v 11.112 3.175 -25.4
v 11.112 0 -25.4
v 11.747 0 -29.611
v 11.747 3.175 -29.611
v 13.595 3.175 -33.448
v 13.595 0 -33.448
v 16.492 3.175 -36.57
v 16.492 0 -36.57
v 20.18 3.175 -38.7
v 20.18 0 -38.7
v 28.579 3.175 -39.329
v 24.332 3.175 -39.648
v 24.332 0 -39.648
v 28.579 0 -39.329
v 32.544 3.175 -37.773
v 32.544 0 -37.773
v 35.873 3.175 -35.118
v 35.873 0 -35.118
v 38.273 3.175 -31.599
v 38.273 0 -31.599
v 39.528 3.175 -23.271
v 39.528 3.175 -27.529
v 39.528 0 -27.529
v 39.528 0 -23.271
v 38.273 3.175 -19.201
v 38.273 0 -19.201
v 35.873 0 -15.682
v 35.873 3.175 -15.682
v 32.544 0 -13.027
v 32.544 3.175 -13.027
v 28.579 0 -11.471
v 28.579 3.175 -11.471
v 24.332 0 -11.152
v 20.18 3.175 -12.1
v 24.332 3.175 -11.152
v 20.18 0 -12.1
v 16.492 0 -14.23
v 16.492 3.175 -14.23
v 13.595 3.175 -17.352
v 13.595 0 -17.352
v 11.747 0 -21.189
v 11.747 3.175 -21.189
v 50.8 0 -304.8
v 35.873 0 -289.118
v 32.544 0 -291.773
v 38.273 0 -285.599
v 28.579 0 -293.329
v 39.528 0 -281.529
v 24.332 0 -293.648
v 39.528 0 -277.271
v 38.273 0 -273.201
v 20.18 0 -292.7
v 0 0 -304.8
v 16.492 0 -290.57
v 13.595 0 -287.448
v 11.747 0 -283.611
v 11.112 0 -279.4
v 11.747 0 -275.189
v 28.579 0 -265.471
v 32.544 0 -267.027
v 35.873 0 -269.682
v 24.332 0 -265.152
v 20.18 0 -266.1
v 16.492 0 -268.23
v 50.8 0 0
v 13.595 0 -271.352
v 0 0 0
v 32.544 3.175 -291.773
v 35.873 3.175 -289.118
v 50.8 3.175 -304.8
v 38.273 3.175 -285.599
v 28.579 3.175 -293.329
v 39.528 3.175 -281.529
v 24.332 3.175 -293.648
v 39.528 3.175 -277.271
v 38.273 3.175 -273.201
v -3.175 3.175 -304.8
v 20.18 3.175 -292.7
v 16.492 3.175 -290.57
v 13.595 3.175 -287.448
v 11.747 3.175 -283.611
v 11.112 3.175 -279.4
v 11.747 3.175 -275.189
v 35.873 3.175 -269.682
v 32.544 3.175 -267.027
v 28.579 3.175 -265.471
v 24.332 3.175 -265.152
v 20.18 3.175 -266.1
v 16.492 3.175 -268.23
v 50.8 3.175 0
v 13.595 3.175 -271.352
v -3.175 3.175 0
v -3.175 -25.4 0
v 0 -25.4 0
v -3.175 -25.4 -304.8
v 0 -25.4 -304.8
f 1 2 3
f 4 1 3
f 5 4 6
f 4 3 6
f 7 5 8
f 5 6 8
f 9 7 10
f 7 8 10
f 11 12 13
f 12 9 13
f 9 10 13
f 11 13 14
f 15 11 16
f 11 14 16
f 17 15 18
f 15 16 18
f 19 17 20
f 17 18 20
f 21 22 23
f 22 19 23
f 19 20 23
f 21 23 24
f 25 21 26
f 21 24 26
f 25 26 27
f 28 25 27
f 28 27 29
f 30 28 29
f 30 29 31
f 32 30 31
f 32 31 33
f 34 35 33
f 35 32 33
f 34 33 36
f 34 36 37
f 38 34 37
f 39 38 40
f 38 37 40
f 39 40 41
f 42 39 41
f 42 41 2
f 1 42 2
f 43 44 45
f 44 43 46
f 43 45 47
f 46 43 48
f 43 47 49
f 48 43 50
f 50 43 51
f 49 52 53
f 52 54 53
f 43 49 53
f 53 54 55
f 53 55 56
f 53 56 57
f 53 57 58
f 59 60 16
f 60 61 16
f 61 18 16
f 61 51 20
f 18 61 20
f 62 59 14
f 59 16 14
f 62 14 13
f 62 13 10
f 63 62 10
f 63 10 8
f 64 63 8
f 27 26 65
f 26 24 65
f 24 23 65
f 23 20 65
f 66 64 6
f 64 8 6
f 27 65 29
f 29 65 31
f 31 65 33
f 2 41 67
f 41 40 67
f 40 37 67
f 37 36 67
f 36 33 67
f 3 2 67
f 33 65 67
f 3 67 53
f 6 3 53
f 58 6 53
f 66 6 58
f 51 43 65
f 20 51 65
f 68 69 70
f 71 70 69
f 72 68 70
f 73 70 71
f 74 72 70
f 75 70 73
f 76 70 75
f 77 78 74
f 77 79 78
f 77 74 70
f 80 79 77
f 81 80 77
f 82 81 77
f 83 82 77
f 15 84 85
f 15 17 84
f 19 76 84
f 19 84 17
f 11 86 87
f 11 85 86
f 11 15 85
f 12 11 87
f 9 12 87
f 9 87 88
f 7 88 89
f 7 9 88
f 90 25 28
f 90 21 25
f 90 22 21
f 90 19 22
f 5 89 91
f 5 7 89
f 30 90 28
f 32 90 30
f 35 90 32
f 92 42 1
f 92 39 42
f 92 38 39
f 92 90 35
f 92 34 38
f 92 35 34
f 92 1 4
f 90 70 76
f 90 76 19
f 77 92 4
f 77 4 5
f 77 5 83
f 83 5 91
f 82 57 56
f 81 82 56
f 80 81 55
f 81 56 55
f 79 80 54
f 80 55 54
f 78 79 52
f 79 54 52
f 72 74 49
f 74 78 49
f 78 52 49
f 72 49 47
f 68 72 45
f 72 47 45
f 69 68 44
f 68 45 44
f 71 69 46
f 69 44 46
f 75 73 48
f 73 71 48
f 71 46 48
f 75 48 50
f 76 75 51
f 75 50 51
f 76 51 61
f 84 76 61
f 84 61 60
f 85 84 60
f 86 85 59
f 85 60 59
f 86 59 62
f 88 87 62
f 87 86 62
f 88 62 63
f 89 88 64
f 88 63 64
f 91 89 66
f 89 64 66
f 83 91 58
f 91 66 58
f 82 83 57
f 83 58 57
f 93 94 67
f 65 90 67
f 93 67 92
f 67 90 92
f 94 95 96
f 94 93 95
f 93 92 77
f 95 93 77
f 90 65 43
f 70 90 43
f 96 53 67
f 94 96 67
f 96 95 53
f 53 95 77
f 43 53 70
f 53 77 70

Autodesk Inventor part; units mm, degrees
ref_plane "YZ Plane" through (0, 0, 0) normal (1, 0, 0) x (0, 1, 0)
ref_plane "XZ Plane" through (0, 0, 0) normal (0, 1, 0) x (-1, 0, 0)
ref_plane "XY Plane" through (0, 0, 0) normal (0, 0, 1) x (1, 0, 0)
sketch "Sketch1" plane through (0, 0, 0) normal (0, 1, 0) x (-1, 0, 0)
  line L0 (0, 0) -> (-50.8, 0)
  line L1 (-50.8, 0) -> (-50.8, -304.8)
  line L2 (-50.8, -304.8) -> (0, -304.8)
  line L3 (0, -304.8) -> (0, 0)
  circle A0 centre (-25.4, -25.4) radius 14.2875
  circle A1 centre (-25.4, -279.4) radius 14.2875
  dimension "d0" = 304.8
  dimension "d1" = 50.8
  dimension "d2" = 25.4
  dimension "d3" = 25.4
  dimension "d4" = 25.4
  dimension "d5" = 25.4
  dimension "d6" = 28.575
  dimension "d7" = 28.575
extrude "Extrusion1" add sketch "Sketch1" along normal blind 3.175
sketch "Sketch2" plane through (0, 0, -304.8) normal (-1, 0, 0) x (0, 0, 1)
  line L0 (304.8, 3.175) -> (0, 3.175)
  line L1 (0, 3.175) -> (0, 0)
  line L2 (0, 0) -> (304.8, 0)
  line L3 (304.8, 0) -> (304.8, 3.175)
extrude "Extrusion2" add sketch "Sketch2" along normal blind 3.175
sketch "Sketch3" plane through (0, 0, 0) normal (0, -1, 0) x (1, 0, 0)
  line L0 (0, 0) -> (-3.175, 0)
  line L1 (-3.175, 0) -> (-3.175, -304.8)
  line L2 (-3.175, -304.8) -> (0, -304.8)
  line L3 (0, -304.8) -> (0, 0)
extrude "Extrusion3" add sketch "Sketch3" along normal blind 25.4
properties part number "chainguard" material "Aluminum 6061"
